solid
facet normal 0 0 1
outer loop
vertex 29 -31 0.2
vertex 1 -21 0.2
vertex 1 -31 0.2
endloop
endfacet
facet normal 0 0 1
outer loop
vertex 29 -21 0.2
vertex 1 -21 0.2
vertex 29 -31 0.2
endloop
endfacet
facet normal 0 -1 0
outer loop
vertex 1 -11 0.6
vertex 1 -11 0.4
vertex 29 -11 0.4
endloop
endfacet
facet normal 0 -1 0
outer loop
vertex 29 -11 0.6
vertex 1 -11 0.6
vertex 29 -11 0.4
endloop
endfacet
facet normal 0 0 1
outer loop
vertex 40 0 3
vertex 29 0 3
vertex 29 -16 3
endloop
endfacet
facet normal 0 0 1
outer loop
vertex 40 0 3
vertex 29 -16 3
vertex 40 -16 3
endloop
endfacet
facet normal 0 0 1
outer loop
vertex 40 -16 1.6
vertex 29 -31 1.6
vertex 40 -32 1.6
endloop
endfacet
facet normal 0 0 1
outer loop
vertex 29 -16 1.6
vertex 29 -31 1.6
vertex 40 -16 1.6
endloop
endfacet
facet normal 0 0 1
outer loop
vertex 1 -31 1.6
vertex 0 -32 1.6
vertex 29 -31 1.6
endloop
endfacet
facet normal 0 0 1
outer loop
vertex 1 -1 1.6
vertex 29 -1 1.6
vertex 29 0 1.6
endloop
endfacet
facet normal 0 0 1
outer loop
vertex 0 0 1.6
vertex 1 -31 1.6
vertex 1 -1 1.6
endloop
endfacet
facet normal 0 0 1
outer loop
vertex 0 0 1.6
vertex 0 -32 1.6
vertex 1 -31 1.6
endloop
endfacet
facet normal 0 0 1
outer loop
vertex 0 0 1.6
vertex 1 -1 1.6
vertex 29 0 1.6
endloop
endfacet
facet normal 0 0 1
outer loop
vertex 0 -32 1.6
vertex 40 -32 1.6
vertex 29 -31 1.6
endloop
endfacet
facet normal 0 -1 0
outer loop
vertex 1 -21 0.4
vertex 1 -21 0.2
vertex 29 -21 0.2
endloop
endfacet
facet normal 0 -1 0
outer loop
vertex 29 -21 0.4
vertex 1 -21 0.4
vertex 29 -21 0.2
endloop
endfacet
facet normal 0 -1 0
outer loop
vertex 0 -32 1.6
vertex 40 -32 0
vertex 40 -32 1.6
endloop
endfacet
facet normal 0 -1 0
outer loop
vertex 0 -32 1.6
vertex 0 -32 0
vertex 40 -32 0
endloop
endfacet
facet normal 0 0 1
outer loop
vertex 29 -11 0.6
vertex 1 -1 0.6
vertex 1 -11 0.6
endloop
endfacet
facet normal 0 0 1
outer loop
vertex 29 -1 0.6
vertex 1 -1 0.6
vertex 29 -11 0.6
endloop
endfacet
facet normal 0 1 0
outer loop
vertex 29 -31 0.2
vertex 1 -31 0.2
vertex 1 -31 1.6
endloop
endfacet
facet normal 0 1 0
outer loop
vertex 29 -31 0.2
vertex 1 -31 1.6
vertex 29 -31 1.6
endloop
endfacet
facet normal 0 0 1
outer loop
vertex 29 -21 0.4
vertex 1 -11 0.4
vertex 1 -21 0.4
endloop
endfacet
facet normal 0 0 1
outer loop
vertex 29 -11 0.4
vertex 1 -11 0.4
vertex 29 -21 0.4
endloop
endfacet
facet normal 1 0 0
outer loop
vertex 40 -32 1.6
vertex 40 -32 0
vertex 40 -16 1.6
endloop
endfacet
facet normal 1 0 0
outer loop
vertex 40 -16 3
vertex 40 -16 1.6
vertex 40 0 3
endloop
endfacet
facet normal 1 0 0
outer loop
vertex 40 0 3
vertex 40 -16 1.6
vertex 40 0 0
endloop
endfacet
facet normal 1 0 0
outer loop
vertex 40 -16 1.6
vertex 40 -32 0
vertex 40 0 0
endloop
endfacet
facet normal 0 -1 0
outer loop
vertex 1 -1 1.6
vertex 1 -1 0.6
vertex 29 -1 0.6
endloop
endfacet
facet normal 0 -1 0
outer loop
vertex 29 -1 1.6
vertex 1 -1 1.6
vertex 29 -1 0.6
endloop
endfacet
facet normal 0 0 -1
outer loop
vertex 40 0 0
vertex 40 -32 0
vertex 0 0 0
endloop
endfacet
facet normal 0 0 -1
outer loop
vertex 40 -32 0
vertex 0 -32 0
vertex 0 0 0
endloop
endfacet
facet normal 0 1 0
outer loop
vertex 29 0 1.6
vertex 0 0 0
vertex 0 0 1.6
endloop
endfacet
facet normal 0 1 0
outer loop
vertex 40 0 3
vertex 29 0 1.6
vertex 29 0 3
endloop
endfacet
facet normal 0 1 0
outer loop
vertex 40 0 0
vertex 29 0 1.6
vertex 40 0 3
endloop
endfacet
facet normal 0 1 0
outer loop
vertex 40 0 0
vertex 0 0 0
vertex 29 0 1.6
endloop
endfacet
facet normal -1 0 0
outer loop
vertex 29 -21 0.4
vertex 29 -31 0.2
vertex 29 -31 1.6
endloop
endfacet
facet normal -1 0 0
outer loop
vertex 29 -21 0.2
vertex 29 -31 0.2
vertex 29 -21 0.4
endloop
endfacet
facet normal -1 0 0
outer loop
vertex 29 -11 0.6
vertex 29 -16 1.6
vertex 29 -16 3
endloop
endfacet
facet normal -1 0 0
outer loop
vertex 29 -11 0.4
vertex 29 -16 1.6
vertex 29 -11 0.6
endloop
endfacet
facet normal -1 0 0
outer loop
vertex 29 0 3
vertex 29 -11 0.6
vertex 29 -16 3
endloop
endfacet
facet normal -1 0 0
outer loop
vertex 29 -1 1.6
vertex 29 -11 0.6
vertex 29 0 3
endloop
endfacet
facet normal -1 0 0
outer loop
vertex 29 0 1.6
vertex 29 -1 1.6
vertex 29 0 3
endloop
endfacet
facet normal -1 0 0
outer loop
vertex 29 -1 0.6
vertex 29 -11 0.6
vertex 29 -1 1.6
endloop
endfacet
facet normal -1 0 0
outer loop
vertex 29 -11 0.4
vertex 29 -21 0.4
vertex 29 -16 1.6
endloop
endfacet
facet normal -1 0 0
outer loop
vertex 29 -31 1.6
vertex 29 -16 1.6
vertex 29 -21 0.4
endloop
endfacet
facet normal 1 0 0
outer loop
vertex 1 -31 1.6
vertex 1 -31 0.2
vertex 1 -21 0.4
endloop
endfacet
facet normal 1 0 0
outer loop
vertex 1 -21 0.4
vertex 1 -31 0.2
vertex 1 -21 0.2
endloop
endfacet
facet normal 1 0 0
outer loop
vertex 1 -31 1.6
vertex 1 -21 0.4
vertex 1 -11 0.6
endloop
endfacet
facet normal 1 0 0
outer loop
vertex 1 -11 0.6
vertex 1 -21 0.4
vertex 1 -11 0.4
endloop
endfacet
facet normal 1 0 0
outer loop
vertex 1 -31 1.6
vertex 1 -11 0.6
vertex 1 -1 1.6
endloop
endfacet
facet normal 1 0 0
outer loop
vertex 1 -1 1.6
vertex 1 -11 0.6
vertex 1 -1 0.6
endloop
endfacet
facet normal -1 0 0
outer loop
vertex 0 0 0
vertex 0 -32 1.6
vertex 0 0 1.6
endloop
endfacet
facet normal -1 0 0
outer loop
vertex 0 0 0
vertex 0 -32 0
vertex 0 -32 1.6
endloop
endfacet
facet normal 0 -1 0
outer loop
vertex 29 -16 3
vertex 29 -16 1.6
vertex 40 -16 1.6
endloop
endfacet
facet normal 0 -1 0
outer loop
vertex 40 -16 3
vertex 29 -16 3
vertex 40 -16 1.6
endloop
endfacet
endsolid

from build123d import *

# Parameters (mm, degrees)
F0_W      = 30
F0_H      = 32
F1_DEPTH  = 0.2
F2_W      = 30
F2_H      = 32
F2_W_2    = 28
F2_H_2    = 30
F3_DEPTH  = 1.4
F4_W      = 28
F4_H      = 20
F5_DEPTH  = 0.2
F6_W      = 28
F6_H      = 10
F7_DEPTH  = 0.2
F3_FACE_W = 32
F3_FACE_H = 1.6
F8_DEPTH  = 10
F9_W      = 11
F9_H      = 16
F10_DEPTH = 1.4


with BuildPart() as f1:
    # F0 (on Top) → F1 (new body)
    with BuildSketch(Plane.XY):
        with Locations((15, -16)):
            Rectangle(F0_W, F0_H)
    extrude(amount=F1_DEPTH)

    # F2 (on face) → F3 (join)
    with BuildSketch(Plane.XY.offset(0.2)):
        with Locations((15, -16)):
            Rectangle(F2_W, F2_H)
        with Locations((15, -16)):
            Rectangle(F2_W_2, F2_H_2, mode=Mode.SUBTRACT)
    extrude(amount=F3_DEPTH)

    # F4 (on face) → F5 (join)
    with BuildSketch(Plane.XY.offset(0.2)):
        with Locations((15, -11)):
            Rectangle(F4_W, F4_H)
    extrude(amount=F5_DEPTH)

    # F6 (on face) → F7 (join)
    with BuildSketch(Plane.XY.offset(0.4)):
        with Locations((15, -6)):
            Rectangle(F6_W, F6_H)
    extrude(amount=F7_DEPTH)

    # F3_face (on face) → F8 (join)
    with BuildSketch(Plane(origin=(30, -16, 0.8), x_dir=(0, 1, 0), z_dir=(1, 0, 0))):
        Rectangle(F3_FACE_W, F3_FACE_H)
    extrude(amount=F8_DEPTH)

    # F9 (on face) → F10 (join)
    with BuildSketch(Plane.XY.offset(1.6)):
        with Locations((34.5, -8)):
            Rectangle(F9_W, F9_H)
    extrude(amount=F10_DEPTH)


solid = f1.part
